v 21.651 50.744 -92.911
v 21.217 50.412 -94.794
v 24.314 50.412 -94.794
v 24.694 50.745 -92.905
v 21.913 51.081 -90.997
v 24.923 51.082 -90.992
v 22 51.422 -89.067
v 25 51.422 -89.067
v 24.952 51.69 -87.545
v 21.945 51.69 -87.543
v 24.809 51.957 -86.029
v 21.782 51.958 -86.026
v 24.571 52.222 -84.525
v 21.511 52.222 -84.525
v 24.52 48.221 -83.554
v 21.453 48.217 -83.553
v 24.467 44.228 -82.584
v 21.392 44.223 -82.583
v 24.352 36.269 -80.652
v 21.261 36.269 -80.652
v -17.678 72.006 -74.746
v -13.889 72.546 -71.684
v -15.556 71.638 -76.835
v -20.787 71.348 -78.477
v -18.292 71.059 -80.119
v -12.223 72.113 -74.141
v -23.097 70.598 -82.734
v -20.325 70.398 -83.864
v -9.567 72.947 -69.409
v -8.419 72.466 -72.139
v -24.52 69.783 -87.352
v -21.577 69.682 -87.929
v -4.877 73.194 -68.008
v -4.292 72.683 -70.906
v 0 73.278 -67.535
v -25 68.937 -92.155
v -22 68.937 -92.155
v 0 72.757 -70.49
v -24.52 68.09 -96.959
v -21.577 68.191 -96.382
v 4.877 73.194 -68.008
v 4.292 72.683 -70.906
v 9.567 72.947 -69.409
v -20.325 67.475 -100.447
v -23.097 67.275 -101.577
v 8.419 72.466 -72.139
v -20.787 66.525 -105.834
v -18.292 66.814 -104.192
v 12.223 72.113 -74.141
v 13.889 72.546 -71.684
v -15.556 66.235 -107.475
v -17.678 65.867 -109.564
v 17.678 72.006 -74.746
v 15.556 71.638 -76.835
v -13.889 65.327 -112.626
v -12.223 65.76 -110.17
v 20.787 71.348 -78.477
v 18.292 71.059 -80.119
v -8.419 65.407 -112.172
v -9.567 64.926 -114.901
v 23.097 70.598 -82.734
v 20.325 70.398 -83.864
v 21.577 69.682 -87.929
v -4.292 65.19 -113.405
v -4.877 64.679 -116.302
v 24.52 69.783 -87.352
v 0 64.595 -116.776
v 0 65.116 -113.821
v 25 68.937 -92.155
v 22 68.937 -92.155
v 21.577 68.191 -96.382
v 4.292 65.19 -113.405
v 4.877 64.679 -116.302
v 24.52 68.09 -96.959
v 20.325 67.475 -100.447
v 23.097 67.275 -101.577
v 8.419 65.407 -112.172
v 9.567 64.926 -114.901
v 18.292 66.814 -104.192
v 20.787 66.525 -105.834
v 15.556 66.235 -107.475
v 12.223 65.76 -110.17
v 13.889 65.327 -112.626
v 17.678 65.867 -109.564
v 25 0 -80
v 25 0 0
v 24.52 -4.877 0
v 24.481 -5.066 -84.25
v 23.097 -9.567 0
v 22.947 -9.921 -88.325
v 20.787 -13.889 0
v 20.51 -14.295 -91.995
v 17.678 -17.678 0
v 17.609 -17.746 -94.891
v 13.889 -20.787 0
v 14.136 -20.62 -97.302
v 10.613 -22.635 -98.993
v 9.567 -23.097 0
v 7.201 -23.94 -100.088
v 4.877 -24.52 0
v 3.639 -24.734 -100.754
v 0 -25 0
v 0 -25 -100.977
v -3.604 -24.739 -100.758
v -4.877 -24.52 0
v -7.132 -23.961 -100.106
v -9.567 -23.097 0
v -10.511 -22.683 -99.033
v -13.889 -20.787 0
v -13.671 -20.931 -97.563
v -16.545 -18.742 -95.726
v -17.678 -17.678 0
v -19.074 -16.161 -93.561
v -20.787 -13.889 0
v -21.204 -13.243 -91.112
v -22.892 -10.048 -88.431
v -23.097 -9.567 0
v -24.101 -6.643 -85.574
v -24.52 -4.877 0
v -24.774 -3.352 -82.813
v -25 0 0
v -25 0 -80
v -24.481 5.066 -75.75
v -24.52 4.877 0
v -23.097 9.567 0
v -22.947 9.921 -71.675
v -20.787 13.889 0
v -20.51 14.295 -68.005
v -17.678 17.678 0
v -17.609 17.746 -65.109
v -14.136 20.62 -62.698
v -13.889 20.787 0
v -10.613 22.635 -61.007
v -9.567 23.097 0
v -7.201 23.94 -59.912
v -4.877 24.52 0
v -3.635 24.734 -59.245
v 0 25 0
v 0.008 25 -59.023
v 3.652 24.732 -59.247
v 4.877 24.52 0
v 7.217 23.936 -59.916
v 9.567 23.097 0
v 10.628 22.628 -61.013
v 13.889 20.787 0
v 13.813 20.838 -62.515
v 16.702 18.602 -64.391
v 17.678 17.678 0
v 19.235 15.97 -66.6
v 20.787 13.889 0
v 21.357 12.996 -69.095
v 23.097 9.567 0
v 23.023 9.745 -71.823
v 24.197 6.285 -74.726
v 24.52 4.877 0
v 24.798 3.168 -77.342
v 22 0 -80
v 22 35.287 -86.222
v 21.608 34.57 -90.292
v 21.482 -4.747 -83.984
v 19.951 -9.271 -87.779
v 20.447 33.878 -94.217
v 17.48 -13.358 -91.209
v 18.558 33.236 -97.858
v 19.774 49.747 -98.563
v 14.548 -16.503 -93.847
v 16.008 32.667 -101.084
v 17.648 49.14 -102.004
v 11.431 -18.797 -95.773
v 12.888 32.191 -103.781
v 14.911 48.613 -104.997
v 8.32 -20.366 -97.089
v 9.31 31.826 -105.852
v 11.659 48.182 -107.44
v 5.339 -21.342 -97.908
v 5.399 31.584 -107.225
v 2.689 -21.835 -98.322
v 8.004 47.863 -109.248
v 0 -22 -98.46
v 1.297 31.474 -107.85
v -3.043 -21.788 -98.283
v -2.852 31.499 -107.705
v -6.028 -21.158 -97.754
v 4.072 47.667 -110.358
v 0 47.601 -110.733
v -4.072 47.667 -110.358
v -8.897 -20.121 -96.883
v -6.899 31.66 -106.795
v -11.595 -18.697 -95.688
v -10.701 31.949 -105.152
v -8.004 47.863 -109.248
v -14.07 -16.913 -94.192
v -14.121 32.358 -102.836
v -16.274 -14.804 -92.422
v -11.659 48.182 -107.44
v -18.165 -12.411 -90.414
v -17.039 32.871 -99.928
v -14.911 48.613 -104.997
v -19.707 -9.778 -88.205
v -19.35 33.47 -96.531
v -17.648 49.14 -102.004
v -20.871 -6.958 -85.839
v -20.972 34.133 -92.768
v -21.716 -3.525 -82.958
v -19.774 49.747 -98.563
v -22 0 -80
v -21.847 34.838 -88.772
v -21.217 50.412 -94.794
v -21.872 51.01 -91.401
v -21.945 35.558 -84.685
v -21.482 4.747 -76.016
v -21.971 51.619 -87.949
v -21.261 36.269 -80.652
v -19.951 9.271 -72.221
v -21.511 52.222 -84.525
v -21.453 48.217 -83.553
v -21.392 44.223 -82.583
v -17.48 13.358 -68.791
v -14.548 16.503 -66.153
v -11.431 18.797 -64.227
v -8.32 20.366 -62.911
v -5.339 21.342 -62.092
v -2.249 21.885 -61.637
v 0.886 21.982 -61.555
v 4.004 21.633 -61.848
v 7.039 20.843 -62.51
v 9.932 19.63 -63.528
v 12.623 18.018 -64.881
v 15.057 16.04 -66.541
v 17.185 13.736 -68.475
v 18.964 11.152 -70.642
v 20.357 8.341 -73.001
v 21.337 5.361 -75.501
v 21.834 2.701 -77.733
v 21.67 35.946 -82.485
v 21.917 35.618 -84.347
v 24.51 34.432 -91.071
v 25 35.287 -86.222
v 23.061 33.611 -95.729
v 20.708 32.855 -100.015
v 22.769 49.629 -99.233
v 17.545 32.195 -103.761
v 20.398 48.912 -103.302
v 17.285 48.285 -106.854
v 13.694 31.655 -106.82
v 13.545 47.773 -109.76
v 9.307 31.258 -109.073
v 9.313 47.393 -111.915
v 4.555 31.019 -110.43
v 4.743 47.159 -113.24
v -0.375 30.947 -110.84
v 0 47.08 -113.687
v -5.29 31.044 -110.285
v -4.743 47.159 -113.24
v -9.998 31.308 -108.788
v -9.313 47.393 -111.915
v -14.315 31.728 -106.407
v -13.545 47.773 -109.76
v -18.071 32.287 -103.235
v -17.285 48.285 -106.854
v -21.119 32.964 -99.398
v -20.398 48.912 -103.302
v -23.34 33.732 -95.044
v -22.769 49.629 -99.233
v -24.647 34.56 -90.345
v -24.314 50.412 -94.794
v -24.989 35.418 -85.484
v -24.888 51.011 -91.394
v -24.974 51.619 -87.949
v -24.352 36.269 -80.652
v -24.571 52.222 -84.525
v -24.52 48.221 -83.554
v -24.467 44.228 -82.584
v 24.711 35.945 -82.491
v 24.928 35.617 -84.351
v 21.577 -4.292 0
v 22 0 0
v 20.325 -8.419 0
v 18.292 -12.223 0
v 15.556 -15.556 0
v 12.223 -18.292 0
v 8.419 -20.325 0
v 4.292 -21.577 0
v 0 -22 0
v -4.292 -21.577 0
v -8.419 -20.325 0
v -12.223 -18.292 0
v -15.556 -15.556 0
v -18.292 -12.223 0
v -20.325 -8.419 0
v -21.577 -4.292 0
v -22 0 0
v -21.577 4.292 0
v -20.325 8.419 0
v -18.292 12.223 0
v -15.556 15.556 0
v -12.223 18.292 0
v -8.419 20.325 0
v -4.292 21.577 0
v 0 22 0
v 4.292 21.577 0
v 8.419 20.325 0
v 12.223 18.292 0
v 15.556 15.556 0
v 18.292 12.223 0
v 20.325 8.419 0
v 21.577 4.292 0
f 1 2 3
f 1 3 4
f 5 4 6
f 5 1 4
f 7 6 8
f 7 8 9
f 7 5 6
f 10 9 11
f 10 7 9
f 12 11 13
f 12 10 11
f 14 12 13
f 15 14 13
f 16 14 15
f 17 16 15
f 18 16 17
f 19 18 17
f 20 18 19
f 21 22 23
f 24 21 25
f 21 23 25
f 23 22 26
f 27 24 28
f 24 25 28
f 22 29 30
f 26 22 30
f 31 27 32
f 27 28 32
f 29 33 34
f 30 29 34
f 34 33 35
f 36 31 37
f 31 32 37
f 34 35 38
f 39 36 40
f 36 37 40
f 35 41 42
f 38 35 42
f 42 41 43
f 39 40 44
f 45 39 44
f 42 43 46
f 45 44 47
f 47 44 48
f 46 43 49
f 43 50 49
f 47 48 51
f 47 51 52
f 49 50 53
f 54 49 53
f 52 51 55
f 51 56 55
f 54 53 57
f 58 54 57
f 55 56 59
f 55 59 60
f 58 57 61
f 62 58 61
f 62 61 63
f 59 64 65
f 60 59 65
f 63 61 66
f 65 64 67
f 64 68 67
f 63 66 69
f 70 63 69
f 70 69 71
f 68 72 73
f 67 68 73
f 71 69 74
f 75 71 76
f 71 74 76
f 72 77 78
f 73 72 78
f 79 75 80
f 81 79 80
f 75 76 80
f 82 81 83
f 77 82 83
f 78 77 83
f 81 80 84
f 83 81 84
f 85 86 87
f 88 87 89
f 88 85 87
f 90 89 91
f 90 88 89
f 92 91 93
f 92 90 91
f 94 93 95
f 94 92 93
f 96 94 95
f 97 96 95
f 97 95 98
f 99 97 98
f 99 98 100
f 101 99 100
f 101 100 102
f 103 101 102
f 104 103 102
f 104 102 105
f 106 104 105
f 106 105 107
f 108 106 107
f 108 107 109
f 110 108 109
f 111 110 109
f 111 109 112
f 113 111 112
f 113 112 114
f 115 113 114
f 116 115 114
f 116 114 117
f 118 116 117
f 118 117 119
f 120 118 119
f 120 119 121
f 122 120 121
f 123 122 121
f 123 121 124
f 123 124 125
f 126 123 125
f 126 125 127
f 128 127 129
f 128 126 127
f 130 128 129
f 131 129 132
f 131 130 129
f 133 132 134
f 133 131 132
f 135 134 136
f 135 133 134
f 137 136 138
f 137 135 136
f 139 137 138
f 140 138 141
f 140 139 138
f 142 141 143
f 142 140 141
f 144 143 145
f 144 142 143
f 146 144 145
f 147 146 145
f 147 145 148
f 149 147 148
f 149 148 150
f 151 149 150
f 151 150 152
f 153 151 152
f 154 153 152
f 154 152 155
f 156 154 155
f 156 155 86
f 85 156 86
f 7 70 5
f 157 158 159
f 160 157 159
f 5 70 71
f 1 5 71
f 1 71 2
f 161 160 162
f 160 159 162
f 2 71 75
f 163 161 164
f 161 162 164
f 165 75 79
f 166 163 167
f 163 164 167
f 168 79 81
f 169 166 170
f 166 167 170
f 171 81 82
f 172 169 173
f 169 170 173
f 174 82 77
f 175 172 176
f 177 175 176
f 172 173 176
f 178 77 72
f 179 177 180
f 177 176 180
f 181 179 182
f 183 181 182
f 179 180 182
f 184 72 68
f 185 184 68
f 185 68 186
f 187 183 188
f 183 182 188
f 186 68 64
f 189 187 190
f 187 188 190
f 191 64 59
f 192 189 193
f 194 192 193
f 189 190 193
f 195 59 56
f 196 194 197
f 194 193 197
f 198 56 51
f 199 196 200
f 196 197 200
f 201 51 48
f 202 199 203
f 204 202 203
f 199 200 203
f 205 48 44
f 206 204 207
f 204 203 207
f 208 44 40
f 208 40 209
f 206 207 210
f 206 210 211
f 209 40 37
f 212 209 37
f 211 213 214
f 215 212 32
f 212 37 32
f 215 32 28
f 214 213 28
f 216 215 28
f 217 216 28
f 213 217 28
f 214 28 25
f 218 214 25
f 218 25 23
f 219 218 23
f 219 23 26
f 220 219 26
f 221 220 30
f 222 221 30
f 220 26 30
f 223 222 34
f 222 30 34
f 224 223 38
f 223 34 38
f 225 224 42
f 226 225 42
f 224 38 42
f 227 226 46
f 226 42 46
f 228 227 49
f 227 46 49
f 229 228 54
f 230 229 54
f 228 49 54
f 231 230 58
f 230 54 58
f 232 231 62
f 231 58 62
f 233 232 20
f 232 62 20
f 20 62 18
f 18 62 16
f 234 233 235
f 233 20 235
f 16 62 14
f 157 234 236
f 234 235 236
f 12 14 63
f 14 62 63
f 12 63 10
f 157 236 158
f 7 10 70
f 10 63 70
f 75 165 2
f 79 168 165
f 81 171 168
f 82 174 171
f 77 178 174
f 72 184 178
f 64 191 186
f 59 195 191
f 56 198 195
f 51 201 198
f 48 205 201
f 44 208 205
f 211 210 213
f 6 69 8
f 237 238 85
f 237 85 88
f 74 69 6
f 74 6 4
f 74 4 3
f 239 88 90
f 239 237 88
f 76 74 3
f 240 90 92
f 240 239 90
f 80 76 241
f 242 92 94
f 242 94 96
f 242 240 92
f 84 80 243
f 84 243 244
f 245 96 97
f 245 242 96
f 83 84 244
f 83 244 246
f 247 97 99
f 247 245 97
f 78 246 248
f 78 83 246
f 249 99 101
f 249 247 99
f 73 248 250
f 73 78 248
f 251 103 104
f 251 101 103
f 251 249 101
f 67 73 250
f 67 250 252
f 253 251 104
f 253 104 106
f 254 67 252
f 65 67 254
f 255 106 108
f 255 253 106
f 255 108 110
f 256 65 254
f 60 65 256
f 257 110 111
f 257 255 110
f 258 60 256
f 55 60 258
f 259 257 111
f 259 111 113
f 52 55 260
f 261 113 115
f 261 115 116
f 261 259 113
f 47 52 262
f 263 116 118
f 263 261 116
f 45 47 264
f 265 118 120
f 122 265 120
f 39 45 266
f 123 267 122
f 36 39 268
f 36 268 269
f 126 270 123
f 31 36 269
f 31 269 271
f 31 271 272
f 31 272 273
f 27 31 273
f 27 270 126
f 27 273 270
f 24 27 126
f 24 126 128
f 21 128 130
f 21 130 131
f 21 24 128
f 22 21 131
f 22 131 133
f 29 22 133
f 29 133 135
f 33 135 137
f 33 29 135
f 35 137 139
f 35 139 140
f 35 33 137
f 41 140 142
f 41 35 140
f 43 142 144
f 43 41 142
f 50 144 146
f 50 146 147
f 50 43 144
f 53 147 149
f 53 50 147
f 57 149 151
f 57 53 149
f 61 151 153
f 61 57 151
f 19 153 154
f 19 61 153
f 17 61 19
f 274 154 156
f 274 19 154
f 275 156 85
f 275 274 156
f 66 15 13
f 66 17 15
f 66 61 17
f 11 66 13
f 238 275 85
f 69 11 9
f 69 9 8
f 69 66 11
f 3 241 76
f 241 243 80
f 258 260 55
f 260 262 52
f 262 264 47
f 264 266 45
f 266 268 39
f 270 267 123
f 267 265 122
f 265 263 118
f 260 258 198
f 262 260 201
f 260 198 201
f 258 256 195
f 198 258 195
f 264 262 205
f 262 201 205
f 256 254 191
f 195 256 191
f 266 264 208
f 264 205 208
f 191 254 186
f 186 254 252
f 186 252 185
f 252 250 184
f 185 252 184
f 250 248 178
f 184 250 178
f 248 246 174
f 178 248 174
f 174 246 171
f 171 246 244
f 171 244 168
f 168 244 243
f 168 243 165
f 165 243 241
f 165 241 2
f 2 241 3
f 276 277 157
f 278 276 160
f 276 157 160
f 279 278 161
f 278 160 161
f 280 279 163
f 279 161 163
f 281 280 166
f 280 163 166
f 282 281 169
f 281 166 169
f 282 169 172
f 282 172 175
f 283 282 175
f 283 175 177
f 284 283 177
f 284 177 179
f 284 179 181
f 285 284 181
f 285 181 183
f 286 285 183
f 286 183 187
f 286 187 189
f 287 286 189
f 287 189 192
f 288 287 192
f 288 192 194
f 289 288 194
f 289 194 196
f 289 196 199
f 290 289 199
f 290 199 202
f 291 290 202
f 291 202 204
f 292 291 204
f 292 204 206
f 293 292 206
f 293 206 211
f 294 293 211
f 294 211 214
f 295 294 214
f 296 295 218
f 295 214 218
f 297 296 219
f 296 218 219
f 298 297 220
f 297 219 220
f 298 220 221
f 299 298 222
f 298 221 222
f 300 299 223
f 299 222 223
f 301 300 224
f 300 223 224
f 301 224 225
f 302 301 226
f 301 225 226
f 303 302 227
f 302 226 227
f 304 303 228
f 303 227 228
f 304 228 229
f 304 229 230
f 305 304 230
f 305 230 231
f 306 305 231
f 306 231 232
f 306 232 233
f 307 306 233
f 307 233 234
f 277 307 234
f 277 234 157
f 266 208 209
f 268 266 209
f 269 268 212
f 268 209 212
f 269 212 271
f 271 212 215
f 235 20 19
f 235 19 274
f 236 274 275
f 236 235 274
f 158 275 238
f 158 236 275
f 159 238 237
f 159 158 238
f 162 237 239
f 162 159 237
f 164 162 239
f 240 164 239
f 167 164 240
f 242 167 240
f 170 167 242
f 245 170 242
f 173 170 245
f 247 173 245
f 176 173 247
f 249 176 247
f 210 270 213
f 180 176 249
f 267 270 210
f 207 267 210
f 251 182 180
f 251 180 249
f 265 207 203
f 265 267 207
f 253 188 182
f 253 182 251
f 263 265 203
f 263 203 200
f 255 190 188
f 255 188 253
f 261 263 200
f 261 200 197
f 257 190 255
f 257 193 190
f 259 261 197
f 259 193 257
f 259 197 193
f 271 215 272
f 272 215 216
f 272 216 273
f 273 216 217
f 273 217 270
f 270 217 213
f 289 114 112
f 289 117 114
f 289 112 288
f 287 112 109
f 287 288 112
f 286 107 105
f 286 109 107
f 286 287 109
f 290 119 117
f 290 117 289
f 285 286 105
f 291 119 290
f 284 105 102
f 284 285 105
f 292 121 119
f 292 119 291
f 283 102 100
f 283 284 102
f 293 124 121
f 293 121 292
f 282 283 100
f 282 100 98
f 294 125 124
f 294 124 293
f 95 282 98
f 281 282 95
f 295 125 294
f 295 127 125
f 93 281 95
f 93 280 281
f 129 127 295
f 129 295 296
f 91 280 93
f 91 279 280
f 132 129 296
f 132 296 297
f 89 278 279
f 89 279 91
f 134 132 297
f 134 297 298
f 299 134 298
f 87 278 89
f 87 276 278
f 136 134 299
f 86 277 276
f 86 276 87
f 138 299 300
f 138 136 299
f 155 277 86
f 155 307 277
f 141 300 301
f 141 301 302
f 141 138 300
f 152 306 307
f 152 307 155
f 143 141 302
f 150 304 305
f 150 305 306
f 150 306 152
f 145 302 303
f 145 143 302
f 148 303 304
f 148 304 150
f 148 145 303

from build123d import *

# Parameters (mm, degrees)
SKETCH3_R               = 25
SKETCH3_R_2             = 22
CUT_EXTRUDE2_DEPTH      = 26
CUT_EXTRUDE2_DEPTH_BACK = 26


with BuildPart() as part:
    # Sweep1: sweep along a path in Sketch1
    with BuildLine(Plane(origin=(0, 0, 0), x_dir=(0, 0, -1), z_dir=(1, 0, 0))) as sweep1_path:
        Line((0, 0), (80, 0))
        Line((80, 0), (92.155372437, 68.936542711))
    # Sketch3 → Sweep1 (sweep)
    with BuildSketch(Plane.XY):
        Circle(SKETCH3_R)
        Circle(SKETCH3_R_2, mode=Mode.SUBTRACT)
    sweep(path=sweep1_path.line, transition=Transition.RIGHT)

    # Sketch4 → Cut-Extrude2 (cut, two sides)
    with BuildSketch(Plane(origin=(0, 0, 0), x_dir=(0, 0, -1), z_dir=(1, 0, 0))) as cut_extrude2_sk:
        Polygon((110.842308967, 30.946164041), (113.687194162, 47.080309724), (94.794337041, 50.411630176), (84.524899127, 52.222409157), (80.652201417, 36.269494553), align=None)
    extrude(amount=CUT_EXTRUDE2_DEPTH, mode=Mode.SUBTRACT)
    extrude(cut_extrude2_sk.sketch, amount=-CUT_EXTRUDE2_DEPTH_BACK, mode=Mode.SUBTRACT)


solid = part.part
